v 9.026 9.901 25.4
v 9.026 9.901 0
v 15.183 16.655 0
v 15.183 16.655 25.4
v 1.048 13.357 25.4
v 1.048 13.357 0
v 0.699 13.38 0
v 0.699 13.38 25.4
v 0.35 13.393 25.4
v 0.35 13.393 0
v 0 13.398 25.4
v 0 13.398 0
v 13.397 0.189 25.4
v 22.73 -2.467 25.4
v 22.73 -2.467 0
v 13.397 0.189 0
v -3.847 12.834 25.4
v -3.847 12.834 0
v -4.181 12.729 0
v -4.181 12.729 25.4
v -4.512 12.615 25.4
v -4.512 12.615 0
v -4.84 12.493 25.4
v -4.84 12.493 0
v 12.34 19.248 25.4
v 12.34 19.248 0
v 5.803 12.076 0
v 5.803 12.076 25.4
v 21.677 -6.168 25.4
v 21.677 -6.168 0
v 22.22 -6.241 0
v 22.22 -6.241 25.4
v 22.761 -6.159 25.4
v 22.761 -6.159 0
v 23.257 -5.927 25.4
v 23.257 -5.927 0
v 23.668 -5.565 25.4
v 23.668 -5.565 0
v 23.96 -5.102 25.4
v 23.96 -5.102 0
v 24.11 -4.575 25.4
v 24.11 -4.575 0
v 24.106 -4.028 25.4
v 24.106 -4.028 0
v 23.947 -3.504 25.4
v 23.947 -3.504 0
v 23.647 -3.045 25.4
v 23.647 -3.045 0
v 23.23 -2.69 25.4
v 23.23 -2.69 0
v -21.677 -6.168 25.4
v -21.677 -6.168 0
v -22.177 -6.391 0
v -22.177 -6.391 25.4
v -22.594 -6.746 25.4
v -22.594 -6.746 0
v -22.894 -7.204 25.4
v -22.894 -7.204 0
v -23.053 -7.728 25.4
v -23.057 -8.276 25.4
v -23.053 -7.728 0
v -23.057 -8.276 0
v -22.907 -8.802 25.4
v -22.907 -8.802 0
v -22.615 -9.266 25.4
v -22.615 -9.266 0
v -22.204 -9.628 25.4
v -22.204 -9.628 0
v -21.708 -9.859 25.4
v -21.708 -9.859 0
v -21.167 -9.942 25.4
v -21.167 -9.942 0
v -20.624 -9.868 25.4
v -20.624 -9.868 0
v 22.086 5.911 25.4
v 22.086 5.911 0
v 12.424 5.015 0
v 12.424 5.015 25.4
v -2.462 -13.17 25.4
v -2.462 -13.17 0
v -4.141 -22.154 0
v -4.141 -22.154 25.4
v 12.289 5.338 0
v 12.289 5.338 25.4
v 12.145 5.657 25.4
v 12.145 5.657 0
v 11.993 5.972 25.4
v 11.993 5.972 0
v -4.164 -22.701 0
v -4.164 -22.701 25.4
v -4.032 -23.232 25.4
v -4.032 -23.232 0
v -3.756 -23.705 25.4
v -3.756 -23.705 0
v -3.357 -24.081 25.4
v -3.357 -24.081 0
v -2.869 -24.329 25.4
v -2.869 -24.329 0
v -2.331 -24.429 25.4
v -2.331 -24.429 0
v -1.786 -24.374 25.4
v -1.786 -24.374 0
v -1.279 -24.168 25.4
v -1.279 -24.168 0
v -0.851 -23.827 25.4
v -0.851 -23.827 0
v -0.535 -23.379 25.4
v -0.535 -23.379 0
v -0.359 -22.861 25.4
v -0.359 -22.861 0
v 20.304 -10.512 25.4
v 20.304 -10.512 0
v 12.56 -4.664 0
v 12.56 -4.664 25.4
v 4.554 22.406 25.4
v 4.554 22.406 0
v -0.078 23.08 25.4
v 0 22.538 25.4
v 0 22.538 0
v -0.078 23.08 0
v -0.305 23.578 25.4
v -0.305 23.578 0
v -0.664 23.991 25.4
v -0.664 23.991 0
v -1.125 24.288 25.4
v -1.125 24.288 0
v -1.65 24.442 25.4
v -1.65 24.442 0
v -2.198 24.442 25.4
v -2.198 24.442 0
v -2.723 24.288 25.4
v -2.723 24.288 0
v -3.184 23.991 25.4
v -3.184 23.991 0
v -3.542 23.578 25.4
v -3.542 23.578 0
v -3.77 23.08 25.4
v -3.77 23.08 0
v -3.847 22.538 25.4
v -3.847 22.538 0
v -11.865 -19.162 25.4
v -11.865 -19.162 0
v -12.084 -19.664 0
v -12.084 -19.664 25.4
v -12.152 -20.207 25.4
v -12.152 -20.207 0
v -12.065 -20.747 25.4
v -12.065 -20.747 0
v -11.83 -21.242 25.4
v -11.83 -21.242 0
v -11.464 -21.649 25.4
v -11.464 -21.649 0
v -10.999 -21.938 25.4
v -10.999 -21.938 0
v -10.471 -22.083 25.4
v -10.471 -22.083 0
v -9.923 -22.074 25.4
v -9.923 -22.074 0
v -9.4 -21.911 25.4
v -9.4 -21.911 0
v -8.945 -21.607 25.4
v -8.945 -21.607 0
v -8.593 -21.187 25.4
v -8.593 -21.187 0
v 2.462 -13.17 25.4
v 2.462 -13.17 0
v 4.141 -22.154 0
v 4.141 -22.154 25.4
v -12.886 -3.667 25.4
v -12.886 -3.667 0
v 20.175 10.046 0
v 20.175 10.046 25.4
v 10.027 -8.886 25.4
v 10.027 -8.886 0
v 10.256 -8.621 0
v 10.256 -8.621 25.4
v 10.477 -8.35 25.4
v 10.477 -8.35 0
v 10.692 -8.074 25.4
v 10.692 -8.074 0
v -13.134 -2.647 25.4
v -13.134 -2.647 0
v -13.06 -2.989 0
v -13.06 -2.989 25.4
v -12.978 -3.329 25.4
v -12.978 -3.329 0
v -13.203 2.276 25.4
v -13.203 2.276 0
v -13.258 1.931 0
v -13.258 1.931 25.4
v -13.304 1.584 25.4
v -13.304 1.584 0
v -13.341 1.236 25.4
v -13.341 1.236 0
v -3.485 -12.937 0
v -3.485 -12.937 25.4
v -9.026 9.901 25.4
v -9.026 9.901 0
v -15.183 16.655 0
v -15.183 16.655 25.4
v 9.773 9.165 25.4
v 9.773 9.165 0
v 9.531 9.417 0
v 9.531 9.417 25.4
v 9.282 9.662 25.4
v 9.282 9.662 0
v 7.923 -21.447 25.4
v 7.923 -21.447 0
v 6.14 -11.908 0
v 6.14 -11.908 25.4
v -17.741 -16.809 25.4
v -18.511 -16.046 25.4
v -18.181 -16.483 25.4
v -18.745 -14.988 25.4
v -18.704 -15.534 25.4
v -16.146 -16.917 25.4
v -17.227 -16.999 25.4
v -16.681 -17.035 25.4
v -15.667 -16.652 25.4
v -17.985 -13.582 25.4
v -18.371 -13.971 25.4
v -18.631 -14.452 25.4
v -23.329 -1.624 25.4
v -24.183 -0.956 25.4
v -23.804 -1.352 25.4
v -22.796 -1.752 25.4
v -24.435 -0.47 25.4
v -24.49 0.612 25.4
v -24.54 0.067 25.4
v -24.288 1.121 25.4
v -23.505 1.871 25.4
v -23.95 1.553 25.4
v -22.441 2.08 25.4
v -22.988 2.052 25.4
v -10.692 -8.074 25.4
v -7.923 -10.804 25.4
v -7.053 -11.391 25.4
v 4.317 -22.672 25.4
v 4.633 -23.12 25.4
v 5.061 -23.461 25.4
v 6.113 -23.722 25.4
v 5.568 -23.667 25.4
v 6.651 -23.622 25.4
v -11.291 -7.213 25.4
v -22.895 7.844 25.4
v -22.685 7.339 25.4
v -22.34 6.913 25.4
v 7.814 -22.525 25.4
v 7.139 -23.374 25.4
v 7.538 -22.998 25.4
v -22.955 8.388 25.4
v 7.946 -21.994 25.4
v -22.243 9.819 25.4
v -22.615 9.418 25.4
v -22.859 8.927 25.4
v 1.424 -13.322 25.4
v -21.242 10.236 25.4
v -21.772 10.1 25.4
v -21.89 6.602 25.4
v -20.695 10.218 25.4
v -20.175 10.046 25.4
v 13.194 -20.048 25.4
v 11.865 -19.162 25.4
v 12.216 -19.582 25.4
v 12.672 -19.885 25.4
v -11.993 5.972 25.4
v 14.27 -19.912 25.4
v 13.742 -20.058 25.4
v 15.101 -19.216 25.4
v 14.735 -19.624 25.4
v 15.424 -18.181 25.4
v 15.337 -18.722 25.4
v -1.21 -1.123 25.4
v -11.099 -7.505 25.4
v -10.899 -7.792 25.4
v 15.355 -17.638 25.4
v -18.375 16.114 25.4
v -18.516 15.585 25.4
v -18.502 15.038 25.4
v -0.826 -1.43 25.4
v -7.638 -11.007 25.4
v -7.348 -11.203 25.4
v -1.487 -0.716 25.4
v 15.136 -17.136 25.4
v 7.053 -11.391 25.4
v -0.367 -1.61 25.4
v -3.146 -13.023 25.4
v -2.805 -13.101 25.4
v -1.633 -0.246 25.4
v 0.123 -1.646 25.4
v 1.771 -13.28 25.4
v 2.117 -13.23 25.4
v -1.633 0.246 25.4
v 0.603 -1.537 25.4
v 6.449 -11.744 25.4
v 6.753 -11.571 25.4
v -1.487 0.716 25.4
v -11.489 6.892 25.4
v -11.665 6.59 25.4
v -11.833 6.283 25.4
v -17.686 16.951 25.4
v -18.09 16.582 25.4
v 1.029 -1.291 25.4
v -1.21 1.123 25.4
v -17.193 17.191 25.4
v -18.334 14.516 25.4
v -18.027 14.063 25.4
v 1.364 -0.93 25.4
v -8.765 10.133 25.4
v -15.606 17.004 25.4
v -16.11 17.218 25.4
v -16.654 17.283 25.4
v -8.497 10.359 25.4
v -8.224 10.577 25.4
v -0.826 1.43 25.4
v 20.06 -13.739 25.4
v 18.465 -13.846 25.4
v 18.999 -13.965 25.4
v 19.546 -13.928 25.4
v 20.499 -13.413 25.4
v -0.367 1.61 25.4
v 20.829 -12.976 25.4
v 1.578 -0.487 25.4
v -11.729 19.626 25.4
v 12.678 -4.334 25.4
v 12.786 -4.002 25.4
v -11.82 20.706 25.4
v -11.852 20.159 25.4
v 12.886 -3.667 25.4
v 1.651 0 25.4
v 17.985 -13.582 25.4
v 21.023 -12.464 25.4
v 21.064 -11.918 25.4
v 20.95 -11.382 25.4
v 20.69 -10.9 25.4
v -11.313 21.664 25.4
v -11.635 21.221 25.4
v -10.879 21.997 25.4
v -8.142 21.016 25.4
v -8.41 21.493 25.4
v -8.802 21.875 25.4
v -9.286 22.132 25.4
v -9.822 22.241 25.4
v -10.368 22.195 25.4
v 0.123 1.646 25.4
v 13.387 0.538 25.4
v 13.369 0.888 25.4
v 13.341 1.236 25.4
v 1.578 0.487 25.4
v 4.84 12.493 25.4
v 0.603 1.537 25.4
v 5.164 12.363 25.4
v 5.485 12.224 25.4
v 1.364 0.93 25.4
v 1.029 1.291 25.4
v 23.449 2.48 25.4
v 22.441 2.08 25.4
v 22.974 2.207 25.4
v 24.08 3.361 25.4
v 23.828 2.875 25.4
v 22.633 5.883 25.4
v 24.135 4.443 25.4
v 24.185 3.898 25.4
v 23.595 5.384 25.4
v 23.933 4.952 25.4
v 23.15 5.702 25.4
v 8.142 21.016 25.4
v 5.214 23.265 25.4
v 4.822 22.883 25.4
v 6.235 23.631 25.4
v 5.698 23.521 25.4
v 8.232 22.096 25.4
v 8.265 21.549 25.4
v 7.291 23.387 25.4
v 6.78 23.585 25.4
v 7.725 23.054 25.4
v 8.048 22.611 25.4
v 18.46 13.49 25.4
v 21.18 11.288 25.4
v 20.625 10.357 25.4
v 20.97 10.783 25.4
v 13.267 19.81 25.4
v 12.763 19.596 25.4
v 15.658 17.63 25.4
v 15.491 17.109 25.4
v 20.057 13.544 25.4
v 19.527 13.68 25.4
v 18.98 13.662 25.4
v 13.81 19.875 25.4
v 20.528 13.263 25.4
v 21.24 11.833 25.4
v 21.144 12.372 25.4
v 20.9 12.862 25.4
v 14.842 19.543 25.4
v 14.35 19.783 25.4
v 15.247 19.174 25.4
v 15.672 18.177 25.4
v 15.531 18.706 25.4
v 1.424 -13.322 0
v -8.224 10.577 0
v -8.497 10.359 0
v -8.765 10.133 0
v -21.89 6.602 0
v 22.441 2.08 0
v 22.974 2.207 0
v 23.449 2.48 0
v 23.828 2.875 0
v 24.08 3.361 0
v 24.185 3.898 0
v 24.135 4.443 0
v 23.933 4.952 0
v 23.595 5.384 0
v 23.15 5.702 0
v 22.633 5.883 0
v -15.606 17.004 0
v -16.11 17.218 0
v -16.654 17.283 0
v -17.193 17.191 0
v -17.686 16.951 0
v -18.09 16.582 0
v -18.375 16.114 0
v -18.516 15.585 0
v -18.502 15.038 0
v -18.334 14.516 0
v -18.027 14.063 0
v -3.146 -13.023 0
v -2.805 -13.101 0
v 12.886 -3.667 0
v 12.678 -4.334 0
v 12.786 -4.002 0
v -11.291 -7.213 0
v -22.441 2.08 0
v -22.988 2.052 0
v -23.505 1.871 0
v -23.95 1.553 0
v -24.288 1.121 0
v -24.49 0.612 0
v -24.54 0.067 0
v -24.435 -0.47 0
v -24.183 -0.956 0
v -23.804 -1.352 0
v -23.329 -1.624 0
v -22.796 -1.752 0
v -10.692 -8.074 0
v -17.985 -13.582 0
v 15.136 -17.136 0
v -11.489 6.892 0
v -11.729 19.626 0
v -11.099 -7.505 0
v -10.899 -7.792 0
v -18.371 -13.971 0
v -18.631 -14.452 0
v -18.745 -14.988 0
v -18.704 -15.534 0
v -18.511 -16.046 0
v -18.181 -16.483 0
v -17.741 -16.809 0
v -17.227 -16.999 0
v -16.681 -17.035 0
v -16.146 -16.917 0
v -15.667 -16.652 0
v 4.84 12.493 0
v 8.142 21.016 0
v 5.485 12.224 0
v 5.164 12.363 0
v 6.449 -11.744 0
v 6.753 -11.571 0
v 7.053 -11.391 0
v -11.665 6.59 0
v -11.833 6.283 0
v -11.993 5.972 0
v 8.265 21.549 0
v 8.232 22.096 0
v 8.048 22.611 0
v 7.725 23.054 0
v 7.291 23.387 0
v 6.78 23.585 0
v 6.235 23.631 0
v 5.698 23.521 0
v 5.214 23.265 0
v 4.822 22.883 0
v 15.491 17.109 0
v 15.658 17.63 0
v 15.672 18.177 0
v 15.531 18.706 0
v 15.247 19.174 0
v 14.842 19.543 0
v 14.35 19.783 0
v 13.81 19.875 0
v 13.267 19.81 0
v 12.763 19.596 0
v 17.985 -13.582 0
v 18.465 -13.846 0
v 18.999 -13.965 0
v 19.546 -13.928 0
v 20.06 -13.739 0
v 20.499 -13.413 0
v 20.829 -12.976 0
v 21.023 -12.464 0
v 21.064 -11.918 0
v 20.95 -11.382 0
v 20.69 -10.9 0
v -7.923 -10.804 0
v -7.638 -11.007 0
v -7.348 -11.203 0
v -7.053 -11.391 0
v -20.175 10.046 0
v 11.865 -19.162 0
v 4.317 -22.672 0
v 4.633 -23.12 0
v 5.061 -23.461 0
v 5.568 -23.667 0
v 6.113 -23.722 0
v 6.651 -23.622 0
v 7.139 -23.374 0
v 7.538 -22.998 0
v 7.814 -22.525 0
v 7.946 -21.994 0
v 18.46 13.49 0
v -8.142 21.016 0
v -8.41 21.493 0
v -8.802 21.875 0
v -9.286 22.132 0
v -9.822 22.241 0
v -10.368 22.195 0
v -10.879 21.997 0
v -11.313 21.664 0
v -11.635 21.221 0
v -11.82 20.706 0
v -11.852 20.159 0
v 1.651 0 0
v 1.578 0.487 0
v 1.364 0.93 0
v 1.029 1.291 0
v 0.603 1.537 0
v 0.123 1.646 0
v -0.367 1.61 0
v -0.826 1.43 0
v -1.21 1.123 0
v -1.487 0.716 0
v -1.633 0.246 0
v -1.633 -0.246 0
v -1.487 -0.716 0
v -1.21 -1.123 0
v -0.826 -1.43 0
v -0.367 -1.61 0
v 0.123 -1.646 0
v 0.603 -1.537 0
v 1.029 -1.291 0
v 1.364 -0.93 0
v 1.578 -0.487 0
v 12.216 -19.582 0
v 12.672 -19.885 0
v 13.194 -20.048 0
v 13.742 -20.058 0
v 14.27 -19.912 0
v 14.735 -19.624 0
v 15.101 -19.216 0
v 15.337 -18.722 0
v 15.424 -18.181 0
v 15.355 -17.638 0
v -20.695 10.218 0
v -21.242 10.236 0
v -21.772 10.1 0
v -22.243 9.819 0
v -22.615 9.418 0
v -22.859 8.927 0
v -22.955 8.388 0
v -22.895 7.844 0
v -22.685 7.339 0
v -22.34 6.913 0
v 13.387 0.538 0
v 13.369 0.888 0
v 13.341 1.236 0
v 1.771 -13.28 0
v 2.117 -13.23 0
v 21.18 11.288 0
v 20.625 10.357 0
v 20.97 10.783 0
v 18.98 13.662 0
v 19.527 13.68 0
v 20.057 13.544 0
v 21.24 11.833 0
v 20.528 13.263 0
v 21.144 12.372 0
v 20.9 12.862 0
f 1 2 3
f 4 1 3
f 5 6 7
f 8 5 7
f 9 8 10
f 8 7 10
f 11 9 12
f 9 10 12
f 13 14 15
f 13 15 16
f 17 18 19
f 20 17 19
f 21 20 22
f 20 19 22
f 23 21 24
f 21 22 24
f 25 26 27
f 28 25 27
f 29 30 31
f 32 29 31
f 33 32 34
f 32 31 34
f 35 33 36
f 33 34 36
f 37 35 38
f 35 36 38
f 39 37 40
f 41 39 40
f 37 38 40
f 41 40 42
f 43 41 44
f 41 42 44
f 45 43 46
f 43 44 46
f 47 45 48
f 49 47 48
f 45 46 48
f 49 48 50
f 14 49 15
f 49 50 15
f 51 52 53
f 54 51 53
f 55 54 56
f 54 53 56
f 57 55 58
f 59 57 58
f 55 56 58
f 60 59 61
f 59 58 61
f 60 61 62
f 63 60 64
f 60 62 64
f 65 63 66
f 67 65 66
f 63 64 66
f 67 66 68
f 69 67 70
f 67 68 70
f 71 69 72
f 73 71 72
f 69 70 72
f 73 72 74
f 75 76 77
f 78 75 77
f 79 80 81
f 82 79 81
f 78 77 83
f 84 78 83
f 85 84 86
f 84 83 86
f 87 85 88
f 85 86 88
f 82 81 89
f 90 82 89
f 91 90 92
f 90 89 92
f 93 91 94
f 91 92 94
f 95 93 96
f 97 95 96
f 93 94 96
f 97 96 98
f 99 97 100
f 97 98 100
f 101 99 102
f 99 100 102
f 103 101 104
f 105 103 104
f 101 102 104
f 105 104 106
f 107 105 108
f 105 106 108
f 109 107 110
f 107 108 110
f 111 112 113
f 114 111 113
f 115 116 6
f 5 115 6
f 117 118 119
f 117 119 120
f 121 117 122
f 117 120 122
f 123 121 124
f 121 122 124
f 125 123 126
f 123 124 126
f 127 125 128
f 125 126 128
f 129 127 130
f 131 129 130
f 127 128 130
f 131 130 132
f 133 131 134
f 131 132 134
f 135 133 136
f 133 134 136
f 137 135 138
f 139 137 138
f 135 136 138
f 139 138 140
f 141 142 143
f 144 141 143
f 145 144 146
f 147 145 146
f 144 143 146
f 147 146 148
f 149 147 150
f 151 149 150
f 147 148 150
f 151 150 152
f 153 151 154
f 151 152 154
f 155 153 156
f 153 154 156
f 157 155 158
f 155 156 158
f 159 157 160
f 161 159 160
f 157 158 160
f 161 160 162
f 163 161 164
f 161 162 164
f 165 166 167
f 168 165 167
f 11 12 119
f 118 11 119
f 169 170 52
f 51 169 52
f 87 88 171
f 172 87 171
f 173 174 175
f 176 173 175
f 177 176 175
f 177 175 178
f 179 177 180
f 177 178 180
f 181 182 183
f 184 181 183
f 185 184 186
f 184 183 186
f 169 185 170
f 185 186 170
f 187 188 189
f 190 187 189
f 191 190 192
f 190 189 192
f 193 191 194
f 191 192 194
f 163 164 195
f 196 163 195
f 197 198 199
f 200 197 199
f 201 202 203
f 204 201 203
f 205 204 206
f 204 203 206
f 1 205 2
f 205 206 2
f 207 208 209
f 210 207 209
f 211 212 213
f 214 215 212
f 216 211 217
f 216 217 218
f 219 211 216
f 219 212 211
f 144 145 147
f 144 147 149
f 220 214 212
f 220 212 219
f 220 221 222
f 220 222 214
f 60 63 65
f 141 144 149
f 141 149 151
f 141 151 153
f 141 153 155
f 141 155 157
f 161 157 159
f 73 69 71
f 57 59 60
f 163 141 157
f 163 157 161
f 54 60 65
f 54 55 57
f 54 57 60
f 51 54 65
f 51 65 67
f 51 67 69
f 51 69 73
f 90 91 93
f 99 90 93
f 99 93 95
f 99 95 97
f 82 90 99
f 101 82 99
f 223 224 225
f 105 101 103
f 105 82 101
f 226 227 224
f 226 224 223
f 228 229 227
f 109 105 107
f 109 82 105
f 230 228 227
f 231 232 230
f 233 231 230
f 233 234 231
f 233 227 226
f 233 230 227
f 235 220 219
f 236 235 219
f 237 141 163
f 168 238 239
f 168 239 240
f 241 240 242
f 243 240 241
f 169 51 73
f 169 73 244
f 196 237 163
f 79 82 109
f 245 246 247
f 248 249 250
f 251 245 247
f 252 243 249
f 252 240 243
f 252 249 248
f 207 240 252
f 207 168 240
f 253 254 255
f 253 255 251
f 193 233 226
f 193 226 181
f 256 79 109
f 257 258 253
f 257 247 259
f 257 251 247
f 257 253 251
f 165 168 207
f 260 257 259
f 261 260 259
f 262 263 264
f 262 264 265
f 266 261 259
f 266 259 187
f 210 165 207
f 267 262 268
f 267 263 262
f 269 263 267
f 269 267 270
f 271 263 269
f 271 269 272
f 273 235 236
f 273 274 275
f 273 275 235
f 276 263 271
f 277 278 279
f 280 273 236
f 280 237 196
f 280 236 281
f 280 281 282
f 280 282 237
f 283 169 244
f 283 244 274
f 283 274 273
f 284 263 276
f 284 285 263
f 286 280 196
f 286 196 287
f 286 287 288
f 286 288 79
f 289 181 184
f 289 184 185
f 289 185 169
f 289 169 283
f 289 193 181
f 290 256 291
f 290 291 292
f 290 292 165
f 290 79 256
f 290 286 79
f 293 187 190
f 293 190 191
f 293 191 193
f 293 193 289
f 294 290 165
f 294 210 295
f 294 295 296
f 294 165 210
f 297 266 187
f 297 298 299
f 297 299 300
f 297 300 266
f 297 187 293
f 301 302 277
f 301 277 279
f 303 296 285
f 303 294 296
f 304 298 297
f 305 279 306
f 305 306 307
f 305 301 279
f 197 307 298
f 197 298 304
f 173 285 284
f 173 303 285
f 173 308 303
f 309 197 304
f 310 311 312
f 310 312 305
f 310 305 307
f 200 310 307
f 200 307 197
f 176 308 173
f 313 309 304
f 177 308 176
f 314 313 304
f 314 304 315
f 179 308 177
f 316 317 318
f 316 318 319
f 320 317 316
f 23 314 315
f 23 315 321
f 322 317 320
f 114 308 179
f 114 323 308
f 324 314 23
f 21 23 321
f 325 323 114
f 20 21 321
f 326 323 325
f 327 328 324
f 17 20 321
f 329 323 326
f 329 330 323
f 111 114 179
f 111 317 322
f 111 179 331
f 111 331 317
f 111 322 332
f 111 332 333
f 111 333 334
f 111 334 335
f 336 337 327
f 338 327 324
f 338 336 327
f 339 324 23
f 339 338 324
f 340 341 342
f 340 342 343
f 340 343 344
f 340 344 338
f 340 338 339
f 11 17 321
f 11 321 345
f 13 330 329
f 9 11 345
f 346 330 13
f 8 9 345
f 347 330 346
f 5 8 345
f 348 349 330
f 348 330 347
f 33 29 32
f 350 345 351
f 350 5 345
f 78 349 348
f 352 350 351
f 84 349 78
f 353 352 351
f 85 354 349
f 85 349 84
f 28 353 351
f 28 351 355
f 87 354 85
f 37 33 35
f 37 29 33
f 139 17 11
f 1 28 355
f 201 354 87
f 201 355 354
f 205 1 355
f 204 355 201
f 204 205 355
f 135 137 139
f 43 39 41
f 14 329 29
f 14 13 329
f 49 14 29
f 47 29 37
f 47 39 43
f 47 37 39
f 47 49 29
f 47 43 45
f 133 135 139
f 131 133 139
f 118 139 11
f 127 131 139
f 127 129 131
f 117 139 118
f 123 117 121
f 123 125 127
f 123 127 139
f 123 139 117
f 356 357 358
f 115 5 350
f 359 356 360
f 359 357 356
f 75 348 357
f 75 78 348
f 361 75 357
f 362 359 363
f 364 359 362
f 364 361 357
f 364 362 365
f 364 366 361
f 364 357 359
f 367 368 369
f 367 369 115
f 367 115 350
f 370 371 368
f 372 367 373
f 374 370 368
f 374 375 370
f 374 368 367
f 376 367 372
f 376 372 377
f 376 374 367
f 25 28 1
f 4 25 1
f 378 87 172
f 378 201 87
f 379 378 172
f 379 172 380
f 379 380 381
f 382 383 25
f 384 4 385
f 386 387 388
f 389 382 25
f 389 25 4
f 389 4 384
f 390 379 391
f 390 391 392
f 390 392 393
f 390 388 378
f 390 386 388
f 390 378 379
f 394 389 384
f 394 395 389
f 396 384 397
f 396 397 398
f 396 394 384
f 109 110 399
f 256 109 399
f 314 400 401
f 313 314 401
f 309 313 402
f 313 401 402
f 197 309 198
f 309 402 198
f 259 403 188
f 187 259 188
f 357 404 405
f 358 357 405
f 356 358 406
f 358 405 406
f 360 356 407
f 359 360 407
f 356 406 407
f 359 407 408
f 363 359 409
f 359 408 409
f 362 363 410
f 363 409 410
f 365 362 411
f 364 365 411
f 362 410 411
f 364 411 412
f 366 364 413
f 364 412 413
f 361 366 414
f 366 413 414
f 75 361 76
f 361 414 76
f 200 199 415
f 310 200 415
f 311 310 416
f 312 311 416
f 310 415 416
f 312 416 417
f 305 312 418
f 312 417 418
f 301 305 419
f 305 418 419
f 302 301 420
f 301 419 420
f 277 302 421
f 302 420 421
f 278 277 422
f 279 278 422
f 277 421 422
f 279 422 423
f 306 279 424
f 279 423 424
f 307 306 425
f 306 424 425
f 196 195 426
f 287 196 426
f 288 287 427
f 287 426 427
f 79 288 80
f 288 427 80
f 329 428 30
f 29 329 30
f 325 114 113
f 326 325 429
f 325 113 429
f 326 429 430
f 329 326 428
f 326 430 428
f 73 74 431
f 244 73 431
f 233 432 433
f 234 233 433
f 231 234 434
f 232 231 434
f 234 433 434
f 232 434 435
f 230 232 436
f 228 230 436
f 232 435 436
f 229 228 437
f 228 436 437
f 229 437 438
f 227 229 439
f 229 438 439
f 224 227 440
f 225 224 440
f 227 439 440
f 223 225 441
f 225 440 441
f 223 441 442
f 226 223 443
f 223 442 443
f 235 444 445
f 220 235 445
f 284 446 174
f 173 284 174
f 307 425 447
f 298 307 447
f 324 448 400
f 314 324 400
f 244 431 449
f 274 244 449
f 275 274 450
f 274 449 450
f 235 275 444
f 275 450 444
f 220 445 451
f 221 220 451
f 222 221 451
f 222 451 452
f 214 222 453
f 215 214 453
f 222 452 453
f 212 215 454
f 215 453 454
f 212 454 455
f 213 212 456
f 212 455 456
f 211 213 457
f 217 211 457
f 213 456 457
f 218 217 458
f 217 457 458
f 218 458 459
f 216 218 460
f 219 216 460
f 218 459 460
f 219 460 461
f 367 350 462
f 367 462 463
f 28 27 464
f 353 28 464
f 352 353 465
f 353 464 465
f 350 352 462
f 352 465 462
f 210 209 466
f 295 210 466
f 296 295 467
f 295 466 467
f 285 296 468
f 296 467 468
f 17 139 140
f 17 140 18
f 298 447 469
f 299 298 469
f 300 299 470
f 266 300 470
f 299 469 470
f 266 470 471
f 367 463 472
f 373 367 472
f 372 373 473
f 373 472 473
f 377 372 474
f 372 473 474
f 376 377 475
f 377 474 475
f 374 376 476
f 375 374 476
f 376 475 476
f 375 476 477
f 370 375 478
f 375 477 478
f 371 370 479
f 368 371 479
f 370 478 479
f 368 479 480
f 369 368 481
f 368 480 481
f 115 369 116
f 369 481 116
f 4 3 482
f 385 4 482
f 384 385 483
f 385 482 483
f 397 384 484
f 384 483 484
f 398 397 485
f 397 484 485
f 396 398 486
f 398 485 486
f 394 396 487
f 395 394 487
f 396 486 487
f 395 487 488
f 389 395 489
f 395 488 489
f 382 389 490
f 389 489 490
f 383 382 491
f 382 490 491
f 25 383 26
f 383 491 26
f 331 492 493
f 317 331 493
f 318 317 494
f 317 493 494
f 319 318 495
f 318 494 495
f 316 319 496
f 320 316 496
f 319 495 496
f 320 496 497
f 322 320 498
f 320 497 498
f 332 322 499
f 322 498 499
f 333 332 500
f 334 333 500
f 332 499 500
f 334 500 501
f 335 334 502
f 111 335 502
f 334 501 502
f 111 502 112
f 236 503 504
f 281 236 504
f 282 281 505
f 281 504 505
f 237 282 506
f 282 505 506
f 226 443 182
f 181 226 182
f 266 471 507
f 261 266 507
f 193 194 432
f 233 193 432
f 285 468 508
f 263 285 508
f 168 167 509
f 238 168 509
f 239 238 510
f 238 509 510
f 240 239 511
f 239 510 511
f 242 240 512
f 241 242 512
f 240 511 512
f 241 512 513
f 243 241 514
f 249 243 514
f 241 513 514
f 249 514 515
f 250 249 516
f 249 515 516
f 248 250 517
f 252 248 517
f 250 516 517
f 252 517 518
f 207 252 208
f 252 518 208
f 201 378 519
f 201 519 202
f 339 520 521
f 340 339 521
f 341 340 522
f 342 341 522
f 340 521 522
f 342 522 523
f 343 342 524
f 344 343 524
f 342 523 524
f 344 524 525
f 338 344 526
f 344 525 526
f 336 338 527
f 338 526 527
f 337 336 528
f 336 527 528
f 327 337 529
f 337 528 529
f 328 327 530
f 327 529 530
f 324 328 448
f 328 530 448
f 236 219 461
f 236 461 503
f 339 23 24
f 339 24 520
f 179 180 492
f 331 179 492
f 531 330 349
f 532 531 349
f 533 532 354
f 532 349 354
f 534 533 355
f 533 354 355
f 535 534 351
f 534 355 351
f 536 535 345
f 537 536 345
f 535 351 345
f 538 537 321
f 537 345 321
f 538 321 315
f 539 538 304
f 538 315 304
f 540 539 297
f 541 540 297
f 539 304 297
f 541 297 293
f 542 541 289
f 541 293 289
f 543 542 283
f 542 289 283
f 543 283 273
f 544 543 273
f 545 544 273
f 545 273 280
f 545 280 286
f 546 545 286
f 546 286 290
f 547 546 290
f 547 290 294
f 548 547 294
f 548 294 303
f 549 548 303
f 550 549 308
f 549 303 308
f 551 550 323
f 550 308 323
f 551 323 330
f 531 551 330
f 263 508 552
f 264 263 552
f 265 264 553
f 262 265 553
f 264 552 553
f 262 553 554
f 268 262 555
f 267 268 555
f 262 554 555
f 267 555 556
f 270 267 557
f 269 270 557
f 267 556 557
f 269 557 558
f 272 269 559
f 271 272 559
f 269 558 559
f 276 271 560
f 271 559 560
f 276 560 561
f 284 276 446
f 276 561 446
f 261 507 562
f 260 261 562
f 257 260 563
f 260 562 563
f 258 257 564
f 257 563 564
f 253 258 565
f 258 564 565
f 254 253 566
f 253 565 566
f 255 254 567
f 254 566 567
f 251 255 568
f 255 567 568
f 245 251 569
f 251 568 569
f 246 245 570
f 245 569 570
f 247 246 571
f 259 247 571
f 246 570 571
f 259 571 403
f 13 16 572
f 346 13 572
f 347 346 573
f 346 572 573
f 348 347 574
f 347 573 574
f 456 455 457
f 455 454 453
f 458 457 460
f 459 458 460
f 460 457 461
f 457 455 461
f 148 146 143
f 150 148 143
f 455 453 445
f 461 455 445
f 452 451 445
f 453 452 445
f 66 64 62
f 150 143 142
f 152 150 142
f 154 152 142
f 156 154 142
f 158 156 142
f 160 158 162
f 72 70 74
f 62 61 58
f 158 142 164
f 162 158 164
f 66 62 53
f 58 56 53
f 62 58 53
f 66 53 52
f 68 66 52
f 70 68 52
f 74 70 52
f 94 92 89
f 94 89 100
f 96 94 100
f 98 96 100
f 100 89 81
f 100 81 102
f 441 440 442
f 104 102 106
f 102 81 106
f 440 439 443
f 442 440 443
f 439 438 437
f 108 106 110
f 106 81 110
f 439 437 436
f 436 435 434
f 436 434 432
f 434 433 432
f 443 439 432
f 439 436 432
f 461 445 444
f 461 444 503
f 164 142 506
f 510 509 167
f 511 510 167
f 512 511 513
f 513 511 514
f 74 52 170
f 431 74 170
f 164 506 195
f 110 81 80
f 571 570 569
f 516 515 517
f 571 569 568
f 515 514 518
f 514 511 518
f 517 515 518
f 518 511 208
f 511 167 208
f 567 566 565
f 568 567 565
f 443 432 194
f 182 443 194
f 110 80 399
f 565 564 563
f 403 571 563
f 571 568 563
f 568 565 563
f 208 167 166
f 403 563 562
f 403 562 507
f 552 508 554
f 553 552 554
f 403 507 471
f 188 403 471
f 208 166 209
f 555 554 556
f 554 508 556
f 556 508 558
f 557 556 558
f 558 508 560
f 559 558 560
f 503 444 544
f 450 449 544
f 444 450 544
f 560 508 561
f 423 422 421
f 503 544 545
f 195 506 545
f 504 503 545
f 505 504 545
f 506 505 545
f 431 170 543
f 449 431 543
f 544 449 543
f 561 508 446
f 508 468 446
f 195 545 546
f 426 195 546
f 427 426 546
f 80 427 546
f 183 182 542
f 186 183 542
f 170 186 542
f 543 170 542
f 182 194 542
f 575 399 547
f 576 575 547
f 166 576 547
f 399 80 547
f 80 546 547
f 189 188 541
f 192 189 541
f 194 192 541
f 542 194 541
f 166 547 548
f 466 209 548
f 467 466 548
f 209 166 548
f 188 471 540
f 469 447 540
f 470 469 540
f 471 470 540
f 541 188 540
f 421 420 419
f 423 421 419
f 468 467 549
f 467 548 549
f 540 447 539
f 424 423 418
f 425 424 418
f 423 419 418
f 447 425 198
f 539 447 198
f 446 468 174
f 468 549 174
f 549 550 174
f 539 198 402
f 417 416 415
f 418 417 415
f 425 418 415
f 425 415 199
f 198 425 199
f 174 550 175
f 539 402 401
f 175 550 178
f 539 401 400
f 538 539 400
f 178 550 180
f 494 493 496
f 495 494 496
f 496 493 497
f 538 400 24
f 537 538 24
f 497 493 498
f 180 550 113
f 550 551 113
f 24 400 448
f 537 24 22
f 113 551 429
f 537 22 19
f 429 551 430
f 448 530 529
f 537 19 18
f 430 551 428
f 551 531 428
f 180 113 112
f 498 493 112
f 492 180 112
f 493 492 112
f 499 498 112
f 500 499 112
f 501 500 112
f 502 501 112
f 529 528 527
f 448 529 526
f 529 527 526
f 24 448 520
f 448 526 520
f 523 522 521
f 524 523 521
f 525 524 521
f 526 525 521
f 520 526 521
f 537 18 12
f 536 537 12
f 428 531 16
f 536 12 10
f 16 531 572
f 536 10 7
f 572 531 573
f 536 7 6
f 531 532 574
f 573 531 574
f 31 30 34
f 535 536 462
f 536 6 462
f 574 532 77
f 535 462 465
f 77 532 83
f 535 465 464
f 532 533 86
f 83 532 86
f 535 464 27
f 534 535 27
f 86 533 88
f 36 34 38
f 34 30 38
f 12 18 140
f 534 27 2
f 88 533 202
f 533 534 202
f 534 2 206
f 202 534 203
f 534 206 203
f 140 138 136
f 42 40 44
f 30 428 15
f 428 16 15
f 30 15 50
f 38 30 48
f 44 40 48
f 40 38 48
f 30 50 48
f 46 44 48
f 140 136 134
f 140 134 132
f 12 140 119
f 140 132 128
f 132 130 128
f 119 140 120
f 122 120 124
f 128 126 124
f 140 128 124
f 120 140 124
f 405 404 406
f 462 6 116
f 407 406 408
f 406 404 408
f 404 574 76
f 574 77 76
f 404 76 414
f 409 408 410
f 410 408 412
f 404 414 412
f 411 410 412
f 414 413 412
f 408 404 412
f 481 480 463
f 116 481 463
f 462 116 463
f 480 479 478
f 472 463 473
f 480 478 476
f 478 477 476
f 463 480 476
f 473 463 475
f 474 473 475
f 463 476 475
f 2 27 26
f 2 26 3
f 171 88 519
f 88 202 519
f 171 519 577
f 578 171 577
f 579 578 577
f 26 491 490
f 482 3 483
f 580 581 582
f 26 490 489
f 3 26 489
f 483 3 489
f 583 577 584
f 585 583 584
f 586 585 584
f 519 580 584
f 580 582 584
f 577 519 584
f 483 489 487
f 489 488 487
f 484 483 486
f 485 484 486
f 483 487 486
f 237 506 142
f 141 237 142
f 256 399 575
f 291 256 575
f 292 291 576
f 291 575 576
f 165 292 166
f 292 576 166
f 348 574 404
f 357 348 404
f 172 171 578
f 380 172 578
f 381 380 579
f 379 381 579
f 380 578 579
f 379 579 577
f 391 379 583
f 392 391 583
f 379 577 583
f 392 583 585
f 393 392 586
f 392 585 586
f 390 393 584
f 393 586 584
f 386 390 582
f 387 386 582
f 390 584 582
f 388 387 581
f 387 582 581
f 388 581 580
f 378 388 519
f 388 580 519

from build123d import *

# Parameters (mm, degrees)
F1_DEPTH = 25.4
F2_R     = 1.651
F3_DEPTH = 25.4


with BuildPart() as f1:
    # F0 (on Top) → F1 (new body)
    with BuildSketch(Plane.XY):
        with BuildLine():
            ThreePointArc((12.886483, -3.666521), (13.269461, -1.851011), (13.397941, 0))
            ThreePointArc((13.397941, 0), (13.39761, 0.094267), (13.396615, 0.18853))
            ThreePointArc((13.396615, 0.18853), (13.37896, 0.712915), (13.340788, 1.236206))
            ThreePointArc((13.340788, 1.236206), (13.02016, 3.159153), (12.423866, 5.015214))
            ThreePointArc((12.423866, 5.015214), (12.217975, 5.497811), (11.993345, 5.971976))
            ThreePointArc((11.993345, 5.971976), (10.99972, 7.649247), (9.773206, 9.164566))
            ThreePointArc((9.773206, 9.164566), (9.406884, 9.540198), (9.026135, 9.901198))
            ThreePointArc((9.026135, 9.901198), (7.493707, 11.106268), (5.80262, 12.076193))
            ThreePointArc((5.80262, 12.076193), (5.325341, 12.294128), (4.839895, 12.493208))
            ThreePointArc((4.839895, 12.493208), (2.975627, 13.063326), (1.048358, 13.356862))
            ThreePointArc((1.048358, 13.356862), (0.524581, 13.387668), (0, 13.397941))
            ThreePointArc((0, 13.397941), (-1.944328, 13.256109), (-3.84749, 12.833614))
            ThreePointArc((-3.84749, 12.833614), (-4.347026, 12.673129), (-4.839895, 12.493208))
            ThreePointArc((-4.839895, 12.493208), (-6.601691, 11.658581), (-8.223714, 10.577115))
            ThreePointArc((-8.223714, 10.577115), (-8.631543, 10.247014), (-9.026135, 9.901198))
            ThreePointArc((-9.026135, 9.901198), (-10.367458, 8.486497), (-11.489279, 6.892118))
            ThreePointArc((-11.489279, 6.892118), (-11.750323, 6.436983), (-11.993345, 5.971976))
            ThreePointArc((-11.993345, 5.971976), (-12.733043, 4.168265), (-13.203154, 2.276302))
            ThreePointArc((-13.203154, 2.276302), (-13.282156, 1.757602), (-13.340788, 1.236206))
            ThreePointArc((-13.340788, 1.236206), (-13.37896, -0.712915), (-13.13387, -2.646941))
            ThreePointArc((-13.13387, -2.646941), (-13.02016, -3.159153), (-12.886483, -3.666521))
            ThreePointArc((-12.886483, -3.666521), (-12.217975, -5.497811), (-11.290783, -7.2127))
            ThreePointArc((-11.290783, -7.2127), (-10.99972, -7.649247), (-10.691788, -8.074063))
            ThreePointArc((-10.691788, -8.074063), (-9.406884, -9.540198), (-7.922814, -10.804344))
            ThreePointArc((-7.922814, -10.804344), (-7.493707, -11.106268), (-7.053107, -11.391159))
            ThreePointArc((-7.053107, -11.391159), (-5.325341, -12.294128), (-3.484825, -12.936801))
            ThreePointArc((-3.484825, -12.936801), (-2.975627, -13.063326), (-2.461865, -13.169816))
            ThreePointArc((-2.461865, -13.169816), (-0.524581, -13.387668), (1.423809, -13.322072))
            ThreePointArc((1.423809, -13.322072), (1.944328, -13.256109), (2.461865, -13.169816))
            ThreePointArc((2.461865, -13.169816), (4.347026, -12.673129), (6.14015, -11.908123))
            ThreePointArc((6.14015, -11.908123), (6.601691, -11.658581), (7.053107, -11.391159))
            ThreePointArc((7.053107, -11.391159), (8.631543, -10.247014), (10.027229, -8.885916))
            ThreePointArc((10.027229, -8.885916), (10.367458, -8.486497), (10.691788, -8.074063))
            ThreePointArc((10.691788, -8.074063), (11.750323, -6.436983), (12.560076, -4.663617))
            ThreePointArc((12.560076, -4.663617), (12.733043, -4.168265), (12.886483, -3.666521))
        make_face()
        with BuildLine():
            Line((15.135725, -17.13642), (10.027229, -8.885916))
            ThreePointArc((10.027229, -8.885916), (8.631543, -10.247014), (7.053107, -11.391159))
            Line((7.053107, -11.391159), (11.864523, -19.161862))
            ThreePointArc((11.864523, -19.161862), (14.512845, -19.784742), (15.135725, -17.13642))
        make_face()
        with BuildLine():
            Line((20.304032, -10.511581), (12.560076, -4.663617))
            ThreePointArc((12.560076, -4.663617), (11.750323, -6.436983), (10.691788, -8.074063))
            Line((10.691788, -8.074063), (17.985401, -13.581944))
            ThreePointArc((17.985401, -13.581944), (20.679898, -13.206078), (20.304032, -10.511581))
        make_face()
        with BuildLine():
            ThreePointArc((13.396615, 0.18853), (13.39761, 0.094267), (13.397941, 0))
            ThreePointArc((13.397941, 0), (13.269461, -1.851011), (12.886483, -3.666521))
            Line((12.886483, -3.666521), (21.677251, -6.16771))
            ThreePointArc((21.677251, -6.16771), (24.054016, -4.84386), (22.730167, -2.467095))
            Line((22.730167, -2.467095), (13.396615, 0.18853))
        make_face()
        with BuildLine():
            ThreePointArc((12.423866, 5.015214), (13.02016, 3.159153), (13.340788, 1.236206))
            Line((13.340788, 1.236206), (22.441468, 2.079508))
            ThreePointArc((22.441468, 2.079508), (24.179506, 4.172548), (22.086467, 5.910586))
            Line((22.086467, 5.910586), (12.423866, 5.015214))
        make_face()
        with BuildLine():
            ThreePointArc((9.773206, 9.164566), (10.99972, 7.649247), (11.993345, 5.971976))
            Line((11.993345, 5.971976), (20.174841, 10.045877))
            ThreePointArc((20.174841, 10.045877), (21.03942, 12.62543), (18.459867, 13.490009))
            Line((18.459867, 13.490009), (9.773206, 9.164566))
        make_face()
        with BuildLine():
            ThreePointArc((5.80262, 12.076193), (7.493707, 11.106268), (9.026135, 9.901198))
            Line((9.026135, 9.901198), (15.18349, 16.655495))
            ThreePointArc((15.18349, 16.655495), (15.057844, 19.373178), (12.34016, 19.247532))
            Line((12.34016, 19.247532), (5.80262, 12.076193))
        make_face()
        with BuildLine():
            ThreePointArc((1.048358, 13.356862), (2.975627, 13.063326), (4.839895, 12.493208))
            Line((4.839895, 12.493208), (8.141524, 21.015695))
            ThreePointArc((8.141524, 21.015695), (7.042622, 23.504471), (4.553846, 22.405569))
            Line((4.553846, 22.405569), (1.048358, 13.356862))
        make_face()
        with BuildLine():
            ThreePointArc((-3.84749, 12.833614), (-1.944328, 13.256109), (0, 13.397941))
            Line((0, 13.397941), (0, 22.53761))
            ThreePointArc((0, 22.53761), (-1.923745, 24.461355), (-3.84749, 22.53761))
            Line((-3.84749, 22.53761), (-3.84749, 12.833614))
        make_face()
        with BuildLine():
            ThreePointArc((-8.223714, 10.577115), (-6.601691, 11.658581), (-4.839895, 12.493208))
            Line((-4.839895, 12.493208), (-8.141524, 21.015695))
            ThreePointArc((-8.141524, 21.015695), (-10.6303, 22.114597), (-11.729202, 19.625822))
            Line((-11.729202, 19.625822), (-8.223714, 10.577115))
        make_face()
        with BuildLine():
            ThreePointArc((-11.489279, 6.892118), (-10.367458, 8.486497), (-9.026135, 9.901198))
            Line((-9.026135, 9.901198), (-15.18349, 16.655495))
            ThreePointArc((-15.18349, 16.655495), (-17.901173, 16.781141), (-18.026819, 14.063457))
            Line((-18.026819, 14.063457), (-11.489279, 6.892118))
        make_face()
        with BuildLine():
            ThreePointArc((-13.203154, 2.276302), (-12.733043, 4.168265), (-11.993345, 5.971976))
            Line((-11.993345, 5.971976), (-20.174841, 10.045877))
            ThreePointArc((-20.174841, 10.045877), (-22.754394, 9.181298), (-21.889815, 6.601745))
            Line((-21.889815, 6.601745), (-13.203154, 2.276302))
        make_face()
        with BuildLine():
            Line((-22.79647, -1.751569), (-13.13387, -2.646941))
            ThreePointArc((-13.13387, -2.646941), (-13.37896, -0.712915), (-13.340788, 1.236206))
            Line((-13.340788, 1.236206), (-22.441468, 2.079508))
            ThreePointArc((-22.441468, 2.079508), (-24.534508, 0.34147), (-22.79647, -1.751569))
        make_face()
        with BuildLine():
            Line((-20.624335, -9.868325), (-11.290783, -7.2127))
            ThreePointArc((-11.290783, -7.2127), (-12.217975, -5.497811), (-12.886483, -3.666521))
            Line((-12.886483, -3.666521), (-21.677251, -6.16771))
            ThreePointArc((-21.677251, -6.16771), (-23.001101, -8.544475), (-20.624335, -9.868325))
        make_face()
        with BuildLine():
            Line((-15.66677, -16.652308), (-7.922814, -10.804344))
            ThreePointArc((-7.922814, -10.804344), (-9.406884, -9.540198), (-10.691788, -8.074063))
            Line((-10.691788, -8.074063), (-17.985401, -13.581944))
            ThreePointArc((-17.985401, -13.581944), (-18.361267, -16.276442), (-15.66677, -16.652308))
        make_face()
        with BuildLine():
            Line((-8.593321, -21.187305), (-3.484825, -12.936801))
            ThreePointArc((-3.484825, -12.936801), (-5.325341, -12.294128), (-7.053107, -11.391159))
            Line((-7.053107, -11.391159), (-11.864523, -19.161862))
            ThreePointArc((-11.864523, -19.161862), (-11.241643, -21.810185), (-8.593321, -21.187305))
        make_face()
        with BuildLine():
            Line((-0.359295, -22.860839), (1.423809, -13.322072))
            ThreePointArc((1.423809, -13.322072), (-0.524581, -13.387668), (-2.461865, -13.169816))
            Line((-2.461865, -13.169816), (-4.141275, -22.153864))
            ThreePointArc((-4.141275, -22.153864), (-2.603772, -24.398341), (-0.359295, -22.860839))
        make_face()
        with BuildLine():
            Line((7.923254, -21.44689), (6.14015, -11.908123))
            ThreePointArc((6.14015, -11.908123), (4.347026, -12.673129), (2.461865, -13.169816))
            Line((2.461865, -13.169816), (4.141275, -22.153864))
            ThreePointArc((4.141275, -22.153864), (6.385752, -23.691367), (7.923254, -21.44689))
        make_face()
    extrude(amount=F1_DEPTH)

    # F2 (on face) → F3 (cut)
    with BuildSketch(Plane.XY.offset(25.4)):
        Circle(F2_R)
    extrude(amount=-F3_DEPTH, mode=Mode.SUBTRACT)


solid = f1.part
